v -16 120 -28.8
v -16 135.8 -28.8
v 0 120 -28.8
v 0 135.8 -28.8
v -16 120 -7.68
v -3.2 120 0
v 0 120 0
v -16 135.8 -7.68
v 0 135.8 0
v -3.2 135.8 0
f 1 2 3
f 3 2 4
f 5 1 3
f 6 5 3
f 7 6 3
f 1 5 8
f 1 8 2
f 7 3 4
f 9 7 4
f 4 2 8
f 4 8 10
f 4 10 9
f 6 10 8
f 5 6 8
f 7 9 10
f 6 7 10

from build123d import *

# Parameters (mm, degrees)
SKETCH017_W     = 16
SKETCH017_H     = 15.8
PAD010_DEPTH    = 28.8
POCKET007_DEPTH = 16
PAD137_DEPTH    = 15.8


with BuildPart() as part:
    # Sketch017 (on Face68 of Binder006) → Pad010 (new body)
    with BuildSketch(Plane.XY.offset(-28.8)):
        with Locations((-8, 127.9)):
            Rectangle(SKETCH017_W, SKETCH017_H)
    extrude(amount=PAD010_DEPTH)

    # Sketch018 (on Face3 of Pad010) → Pocket007 (cut)
    with BuildSketch(Plane.XZ.offset(-120)):
        Polygon((0, 0), (-16, -9.6), (-16, 0), align=None)
    extrude(amount=-POCKET007_DEPTH, mode=Mode.SUBTRACT)

    # Sketch141 (on Face6 of Pocket007) → Pad137 (join)
    with BuildSketch(Plane.XZ.offset(-120)):
        Polygon((0, 0), (-3.2, 0), (-16, -7.68), (-16, -10.88), (-3.2, -3.2), (0, -3.2), align=None)
    extrude(amount=-PAD137_DEPTH)


solid = part.part
